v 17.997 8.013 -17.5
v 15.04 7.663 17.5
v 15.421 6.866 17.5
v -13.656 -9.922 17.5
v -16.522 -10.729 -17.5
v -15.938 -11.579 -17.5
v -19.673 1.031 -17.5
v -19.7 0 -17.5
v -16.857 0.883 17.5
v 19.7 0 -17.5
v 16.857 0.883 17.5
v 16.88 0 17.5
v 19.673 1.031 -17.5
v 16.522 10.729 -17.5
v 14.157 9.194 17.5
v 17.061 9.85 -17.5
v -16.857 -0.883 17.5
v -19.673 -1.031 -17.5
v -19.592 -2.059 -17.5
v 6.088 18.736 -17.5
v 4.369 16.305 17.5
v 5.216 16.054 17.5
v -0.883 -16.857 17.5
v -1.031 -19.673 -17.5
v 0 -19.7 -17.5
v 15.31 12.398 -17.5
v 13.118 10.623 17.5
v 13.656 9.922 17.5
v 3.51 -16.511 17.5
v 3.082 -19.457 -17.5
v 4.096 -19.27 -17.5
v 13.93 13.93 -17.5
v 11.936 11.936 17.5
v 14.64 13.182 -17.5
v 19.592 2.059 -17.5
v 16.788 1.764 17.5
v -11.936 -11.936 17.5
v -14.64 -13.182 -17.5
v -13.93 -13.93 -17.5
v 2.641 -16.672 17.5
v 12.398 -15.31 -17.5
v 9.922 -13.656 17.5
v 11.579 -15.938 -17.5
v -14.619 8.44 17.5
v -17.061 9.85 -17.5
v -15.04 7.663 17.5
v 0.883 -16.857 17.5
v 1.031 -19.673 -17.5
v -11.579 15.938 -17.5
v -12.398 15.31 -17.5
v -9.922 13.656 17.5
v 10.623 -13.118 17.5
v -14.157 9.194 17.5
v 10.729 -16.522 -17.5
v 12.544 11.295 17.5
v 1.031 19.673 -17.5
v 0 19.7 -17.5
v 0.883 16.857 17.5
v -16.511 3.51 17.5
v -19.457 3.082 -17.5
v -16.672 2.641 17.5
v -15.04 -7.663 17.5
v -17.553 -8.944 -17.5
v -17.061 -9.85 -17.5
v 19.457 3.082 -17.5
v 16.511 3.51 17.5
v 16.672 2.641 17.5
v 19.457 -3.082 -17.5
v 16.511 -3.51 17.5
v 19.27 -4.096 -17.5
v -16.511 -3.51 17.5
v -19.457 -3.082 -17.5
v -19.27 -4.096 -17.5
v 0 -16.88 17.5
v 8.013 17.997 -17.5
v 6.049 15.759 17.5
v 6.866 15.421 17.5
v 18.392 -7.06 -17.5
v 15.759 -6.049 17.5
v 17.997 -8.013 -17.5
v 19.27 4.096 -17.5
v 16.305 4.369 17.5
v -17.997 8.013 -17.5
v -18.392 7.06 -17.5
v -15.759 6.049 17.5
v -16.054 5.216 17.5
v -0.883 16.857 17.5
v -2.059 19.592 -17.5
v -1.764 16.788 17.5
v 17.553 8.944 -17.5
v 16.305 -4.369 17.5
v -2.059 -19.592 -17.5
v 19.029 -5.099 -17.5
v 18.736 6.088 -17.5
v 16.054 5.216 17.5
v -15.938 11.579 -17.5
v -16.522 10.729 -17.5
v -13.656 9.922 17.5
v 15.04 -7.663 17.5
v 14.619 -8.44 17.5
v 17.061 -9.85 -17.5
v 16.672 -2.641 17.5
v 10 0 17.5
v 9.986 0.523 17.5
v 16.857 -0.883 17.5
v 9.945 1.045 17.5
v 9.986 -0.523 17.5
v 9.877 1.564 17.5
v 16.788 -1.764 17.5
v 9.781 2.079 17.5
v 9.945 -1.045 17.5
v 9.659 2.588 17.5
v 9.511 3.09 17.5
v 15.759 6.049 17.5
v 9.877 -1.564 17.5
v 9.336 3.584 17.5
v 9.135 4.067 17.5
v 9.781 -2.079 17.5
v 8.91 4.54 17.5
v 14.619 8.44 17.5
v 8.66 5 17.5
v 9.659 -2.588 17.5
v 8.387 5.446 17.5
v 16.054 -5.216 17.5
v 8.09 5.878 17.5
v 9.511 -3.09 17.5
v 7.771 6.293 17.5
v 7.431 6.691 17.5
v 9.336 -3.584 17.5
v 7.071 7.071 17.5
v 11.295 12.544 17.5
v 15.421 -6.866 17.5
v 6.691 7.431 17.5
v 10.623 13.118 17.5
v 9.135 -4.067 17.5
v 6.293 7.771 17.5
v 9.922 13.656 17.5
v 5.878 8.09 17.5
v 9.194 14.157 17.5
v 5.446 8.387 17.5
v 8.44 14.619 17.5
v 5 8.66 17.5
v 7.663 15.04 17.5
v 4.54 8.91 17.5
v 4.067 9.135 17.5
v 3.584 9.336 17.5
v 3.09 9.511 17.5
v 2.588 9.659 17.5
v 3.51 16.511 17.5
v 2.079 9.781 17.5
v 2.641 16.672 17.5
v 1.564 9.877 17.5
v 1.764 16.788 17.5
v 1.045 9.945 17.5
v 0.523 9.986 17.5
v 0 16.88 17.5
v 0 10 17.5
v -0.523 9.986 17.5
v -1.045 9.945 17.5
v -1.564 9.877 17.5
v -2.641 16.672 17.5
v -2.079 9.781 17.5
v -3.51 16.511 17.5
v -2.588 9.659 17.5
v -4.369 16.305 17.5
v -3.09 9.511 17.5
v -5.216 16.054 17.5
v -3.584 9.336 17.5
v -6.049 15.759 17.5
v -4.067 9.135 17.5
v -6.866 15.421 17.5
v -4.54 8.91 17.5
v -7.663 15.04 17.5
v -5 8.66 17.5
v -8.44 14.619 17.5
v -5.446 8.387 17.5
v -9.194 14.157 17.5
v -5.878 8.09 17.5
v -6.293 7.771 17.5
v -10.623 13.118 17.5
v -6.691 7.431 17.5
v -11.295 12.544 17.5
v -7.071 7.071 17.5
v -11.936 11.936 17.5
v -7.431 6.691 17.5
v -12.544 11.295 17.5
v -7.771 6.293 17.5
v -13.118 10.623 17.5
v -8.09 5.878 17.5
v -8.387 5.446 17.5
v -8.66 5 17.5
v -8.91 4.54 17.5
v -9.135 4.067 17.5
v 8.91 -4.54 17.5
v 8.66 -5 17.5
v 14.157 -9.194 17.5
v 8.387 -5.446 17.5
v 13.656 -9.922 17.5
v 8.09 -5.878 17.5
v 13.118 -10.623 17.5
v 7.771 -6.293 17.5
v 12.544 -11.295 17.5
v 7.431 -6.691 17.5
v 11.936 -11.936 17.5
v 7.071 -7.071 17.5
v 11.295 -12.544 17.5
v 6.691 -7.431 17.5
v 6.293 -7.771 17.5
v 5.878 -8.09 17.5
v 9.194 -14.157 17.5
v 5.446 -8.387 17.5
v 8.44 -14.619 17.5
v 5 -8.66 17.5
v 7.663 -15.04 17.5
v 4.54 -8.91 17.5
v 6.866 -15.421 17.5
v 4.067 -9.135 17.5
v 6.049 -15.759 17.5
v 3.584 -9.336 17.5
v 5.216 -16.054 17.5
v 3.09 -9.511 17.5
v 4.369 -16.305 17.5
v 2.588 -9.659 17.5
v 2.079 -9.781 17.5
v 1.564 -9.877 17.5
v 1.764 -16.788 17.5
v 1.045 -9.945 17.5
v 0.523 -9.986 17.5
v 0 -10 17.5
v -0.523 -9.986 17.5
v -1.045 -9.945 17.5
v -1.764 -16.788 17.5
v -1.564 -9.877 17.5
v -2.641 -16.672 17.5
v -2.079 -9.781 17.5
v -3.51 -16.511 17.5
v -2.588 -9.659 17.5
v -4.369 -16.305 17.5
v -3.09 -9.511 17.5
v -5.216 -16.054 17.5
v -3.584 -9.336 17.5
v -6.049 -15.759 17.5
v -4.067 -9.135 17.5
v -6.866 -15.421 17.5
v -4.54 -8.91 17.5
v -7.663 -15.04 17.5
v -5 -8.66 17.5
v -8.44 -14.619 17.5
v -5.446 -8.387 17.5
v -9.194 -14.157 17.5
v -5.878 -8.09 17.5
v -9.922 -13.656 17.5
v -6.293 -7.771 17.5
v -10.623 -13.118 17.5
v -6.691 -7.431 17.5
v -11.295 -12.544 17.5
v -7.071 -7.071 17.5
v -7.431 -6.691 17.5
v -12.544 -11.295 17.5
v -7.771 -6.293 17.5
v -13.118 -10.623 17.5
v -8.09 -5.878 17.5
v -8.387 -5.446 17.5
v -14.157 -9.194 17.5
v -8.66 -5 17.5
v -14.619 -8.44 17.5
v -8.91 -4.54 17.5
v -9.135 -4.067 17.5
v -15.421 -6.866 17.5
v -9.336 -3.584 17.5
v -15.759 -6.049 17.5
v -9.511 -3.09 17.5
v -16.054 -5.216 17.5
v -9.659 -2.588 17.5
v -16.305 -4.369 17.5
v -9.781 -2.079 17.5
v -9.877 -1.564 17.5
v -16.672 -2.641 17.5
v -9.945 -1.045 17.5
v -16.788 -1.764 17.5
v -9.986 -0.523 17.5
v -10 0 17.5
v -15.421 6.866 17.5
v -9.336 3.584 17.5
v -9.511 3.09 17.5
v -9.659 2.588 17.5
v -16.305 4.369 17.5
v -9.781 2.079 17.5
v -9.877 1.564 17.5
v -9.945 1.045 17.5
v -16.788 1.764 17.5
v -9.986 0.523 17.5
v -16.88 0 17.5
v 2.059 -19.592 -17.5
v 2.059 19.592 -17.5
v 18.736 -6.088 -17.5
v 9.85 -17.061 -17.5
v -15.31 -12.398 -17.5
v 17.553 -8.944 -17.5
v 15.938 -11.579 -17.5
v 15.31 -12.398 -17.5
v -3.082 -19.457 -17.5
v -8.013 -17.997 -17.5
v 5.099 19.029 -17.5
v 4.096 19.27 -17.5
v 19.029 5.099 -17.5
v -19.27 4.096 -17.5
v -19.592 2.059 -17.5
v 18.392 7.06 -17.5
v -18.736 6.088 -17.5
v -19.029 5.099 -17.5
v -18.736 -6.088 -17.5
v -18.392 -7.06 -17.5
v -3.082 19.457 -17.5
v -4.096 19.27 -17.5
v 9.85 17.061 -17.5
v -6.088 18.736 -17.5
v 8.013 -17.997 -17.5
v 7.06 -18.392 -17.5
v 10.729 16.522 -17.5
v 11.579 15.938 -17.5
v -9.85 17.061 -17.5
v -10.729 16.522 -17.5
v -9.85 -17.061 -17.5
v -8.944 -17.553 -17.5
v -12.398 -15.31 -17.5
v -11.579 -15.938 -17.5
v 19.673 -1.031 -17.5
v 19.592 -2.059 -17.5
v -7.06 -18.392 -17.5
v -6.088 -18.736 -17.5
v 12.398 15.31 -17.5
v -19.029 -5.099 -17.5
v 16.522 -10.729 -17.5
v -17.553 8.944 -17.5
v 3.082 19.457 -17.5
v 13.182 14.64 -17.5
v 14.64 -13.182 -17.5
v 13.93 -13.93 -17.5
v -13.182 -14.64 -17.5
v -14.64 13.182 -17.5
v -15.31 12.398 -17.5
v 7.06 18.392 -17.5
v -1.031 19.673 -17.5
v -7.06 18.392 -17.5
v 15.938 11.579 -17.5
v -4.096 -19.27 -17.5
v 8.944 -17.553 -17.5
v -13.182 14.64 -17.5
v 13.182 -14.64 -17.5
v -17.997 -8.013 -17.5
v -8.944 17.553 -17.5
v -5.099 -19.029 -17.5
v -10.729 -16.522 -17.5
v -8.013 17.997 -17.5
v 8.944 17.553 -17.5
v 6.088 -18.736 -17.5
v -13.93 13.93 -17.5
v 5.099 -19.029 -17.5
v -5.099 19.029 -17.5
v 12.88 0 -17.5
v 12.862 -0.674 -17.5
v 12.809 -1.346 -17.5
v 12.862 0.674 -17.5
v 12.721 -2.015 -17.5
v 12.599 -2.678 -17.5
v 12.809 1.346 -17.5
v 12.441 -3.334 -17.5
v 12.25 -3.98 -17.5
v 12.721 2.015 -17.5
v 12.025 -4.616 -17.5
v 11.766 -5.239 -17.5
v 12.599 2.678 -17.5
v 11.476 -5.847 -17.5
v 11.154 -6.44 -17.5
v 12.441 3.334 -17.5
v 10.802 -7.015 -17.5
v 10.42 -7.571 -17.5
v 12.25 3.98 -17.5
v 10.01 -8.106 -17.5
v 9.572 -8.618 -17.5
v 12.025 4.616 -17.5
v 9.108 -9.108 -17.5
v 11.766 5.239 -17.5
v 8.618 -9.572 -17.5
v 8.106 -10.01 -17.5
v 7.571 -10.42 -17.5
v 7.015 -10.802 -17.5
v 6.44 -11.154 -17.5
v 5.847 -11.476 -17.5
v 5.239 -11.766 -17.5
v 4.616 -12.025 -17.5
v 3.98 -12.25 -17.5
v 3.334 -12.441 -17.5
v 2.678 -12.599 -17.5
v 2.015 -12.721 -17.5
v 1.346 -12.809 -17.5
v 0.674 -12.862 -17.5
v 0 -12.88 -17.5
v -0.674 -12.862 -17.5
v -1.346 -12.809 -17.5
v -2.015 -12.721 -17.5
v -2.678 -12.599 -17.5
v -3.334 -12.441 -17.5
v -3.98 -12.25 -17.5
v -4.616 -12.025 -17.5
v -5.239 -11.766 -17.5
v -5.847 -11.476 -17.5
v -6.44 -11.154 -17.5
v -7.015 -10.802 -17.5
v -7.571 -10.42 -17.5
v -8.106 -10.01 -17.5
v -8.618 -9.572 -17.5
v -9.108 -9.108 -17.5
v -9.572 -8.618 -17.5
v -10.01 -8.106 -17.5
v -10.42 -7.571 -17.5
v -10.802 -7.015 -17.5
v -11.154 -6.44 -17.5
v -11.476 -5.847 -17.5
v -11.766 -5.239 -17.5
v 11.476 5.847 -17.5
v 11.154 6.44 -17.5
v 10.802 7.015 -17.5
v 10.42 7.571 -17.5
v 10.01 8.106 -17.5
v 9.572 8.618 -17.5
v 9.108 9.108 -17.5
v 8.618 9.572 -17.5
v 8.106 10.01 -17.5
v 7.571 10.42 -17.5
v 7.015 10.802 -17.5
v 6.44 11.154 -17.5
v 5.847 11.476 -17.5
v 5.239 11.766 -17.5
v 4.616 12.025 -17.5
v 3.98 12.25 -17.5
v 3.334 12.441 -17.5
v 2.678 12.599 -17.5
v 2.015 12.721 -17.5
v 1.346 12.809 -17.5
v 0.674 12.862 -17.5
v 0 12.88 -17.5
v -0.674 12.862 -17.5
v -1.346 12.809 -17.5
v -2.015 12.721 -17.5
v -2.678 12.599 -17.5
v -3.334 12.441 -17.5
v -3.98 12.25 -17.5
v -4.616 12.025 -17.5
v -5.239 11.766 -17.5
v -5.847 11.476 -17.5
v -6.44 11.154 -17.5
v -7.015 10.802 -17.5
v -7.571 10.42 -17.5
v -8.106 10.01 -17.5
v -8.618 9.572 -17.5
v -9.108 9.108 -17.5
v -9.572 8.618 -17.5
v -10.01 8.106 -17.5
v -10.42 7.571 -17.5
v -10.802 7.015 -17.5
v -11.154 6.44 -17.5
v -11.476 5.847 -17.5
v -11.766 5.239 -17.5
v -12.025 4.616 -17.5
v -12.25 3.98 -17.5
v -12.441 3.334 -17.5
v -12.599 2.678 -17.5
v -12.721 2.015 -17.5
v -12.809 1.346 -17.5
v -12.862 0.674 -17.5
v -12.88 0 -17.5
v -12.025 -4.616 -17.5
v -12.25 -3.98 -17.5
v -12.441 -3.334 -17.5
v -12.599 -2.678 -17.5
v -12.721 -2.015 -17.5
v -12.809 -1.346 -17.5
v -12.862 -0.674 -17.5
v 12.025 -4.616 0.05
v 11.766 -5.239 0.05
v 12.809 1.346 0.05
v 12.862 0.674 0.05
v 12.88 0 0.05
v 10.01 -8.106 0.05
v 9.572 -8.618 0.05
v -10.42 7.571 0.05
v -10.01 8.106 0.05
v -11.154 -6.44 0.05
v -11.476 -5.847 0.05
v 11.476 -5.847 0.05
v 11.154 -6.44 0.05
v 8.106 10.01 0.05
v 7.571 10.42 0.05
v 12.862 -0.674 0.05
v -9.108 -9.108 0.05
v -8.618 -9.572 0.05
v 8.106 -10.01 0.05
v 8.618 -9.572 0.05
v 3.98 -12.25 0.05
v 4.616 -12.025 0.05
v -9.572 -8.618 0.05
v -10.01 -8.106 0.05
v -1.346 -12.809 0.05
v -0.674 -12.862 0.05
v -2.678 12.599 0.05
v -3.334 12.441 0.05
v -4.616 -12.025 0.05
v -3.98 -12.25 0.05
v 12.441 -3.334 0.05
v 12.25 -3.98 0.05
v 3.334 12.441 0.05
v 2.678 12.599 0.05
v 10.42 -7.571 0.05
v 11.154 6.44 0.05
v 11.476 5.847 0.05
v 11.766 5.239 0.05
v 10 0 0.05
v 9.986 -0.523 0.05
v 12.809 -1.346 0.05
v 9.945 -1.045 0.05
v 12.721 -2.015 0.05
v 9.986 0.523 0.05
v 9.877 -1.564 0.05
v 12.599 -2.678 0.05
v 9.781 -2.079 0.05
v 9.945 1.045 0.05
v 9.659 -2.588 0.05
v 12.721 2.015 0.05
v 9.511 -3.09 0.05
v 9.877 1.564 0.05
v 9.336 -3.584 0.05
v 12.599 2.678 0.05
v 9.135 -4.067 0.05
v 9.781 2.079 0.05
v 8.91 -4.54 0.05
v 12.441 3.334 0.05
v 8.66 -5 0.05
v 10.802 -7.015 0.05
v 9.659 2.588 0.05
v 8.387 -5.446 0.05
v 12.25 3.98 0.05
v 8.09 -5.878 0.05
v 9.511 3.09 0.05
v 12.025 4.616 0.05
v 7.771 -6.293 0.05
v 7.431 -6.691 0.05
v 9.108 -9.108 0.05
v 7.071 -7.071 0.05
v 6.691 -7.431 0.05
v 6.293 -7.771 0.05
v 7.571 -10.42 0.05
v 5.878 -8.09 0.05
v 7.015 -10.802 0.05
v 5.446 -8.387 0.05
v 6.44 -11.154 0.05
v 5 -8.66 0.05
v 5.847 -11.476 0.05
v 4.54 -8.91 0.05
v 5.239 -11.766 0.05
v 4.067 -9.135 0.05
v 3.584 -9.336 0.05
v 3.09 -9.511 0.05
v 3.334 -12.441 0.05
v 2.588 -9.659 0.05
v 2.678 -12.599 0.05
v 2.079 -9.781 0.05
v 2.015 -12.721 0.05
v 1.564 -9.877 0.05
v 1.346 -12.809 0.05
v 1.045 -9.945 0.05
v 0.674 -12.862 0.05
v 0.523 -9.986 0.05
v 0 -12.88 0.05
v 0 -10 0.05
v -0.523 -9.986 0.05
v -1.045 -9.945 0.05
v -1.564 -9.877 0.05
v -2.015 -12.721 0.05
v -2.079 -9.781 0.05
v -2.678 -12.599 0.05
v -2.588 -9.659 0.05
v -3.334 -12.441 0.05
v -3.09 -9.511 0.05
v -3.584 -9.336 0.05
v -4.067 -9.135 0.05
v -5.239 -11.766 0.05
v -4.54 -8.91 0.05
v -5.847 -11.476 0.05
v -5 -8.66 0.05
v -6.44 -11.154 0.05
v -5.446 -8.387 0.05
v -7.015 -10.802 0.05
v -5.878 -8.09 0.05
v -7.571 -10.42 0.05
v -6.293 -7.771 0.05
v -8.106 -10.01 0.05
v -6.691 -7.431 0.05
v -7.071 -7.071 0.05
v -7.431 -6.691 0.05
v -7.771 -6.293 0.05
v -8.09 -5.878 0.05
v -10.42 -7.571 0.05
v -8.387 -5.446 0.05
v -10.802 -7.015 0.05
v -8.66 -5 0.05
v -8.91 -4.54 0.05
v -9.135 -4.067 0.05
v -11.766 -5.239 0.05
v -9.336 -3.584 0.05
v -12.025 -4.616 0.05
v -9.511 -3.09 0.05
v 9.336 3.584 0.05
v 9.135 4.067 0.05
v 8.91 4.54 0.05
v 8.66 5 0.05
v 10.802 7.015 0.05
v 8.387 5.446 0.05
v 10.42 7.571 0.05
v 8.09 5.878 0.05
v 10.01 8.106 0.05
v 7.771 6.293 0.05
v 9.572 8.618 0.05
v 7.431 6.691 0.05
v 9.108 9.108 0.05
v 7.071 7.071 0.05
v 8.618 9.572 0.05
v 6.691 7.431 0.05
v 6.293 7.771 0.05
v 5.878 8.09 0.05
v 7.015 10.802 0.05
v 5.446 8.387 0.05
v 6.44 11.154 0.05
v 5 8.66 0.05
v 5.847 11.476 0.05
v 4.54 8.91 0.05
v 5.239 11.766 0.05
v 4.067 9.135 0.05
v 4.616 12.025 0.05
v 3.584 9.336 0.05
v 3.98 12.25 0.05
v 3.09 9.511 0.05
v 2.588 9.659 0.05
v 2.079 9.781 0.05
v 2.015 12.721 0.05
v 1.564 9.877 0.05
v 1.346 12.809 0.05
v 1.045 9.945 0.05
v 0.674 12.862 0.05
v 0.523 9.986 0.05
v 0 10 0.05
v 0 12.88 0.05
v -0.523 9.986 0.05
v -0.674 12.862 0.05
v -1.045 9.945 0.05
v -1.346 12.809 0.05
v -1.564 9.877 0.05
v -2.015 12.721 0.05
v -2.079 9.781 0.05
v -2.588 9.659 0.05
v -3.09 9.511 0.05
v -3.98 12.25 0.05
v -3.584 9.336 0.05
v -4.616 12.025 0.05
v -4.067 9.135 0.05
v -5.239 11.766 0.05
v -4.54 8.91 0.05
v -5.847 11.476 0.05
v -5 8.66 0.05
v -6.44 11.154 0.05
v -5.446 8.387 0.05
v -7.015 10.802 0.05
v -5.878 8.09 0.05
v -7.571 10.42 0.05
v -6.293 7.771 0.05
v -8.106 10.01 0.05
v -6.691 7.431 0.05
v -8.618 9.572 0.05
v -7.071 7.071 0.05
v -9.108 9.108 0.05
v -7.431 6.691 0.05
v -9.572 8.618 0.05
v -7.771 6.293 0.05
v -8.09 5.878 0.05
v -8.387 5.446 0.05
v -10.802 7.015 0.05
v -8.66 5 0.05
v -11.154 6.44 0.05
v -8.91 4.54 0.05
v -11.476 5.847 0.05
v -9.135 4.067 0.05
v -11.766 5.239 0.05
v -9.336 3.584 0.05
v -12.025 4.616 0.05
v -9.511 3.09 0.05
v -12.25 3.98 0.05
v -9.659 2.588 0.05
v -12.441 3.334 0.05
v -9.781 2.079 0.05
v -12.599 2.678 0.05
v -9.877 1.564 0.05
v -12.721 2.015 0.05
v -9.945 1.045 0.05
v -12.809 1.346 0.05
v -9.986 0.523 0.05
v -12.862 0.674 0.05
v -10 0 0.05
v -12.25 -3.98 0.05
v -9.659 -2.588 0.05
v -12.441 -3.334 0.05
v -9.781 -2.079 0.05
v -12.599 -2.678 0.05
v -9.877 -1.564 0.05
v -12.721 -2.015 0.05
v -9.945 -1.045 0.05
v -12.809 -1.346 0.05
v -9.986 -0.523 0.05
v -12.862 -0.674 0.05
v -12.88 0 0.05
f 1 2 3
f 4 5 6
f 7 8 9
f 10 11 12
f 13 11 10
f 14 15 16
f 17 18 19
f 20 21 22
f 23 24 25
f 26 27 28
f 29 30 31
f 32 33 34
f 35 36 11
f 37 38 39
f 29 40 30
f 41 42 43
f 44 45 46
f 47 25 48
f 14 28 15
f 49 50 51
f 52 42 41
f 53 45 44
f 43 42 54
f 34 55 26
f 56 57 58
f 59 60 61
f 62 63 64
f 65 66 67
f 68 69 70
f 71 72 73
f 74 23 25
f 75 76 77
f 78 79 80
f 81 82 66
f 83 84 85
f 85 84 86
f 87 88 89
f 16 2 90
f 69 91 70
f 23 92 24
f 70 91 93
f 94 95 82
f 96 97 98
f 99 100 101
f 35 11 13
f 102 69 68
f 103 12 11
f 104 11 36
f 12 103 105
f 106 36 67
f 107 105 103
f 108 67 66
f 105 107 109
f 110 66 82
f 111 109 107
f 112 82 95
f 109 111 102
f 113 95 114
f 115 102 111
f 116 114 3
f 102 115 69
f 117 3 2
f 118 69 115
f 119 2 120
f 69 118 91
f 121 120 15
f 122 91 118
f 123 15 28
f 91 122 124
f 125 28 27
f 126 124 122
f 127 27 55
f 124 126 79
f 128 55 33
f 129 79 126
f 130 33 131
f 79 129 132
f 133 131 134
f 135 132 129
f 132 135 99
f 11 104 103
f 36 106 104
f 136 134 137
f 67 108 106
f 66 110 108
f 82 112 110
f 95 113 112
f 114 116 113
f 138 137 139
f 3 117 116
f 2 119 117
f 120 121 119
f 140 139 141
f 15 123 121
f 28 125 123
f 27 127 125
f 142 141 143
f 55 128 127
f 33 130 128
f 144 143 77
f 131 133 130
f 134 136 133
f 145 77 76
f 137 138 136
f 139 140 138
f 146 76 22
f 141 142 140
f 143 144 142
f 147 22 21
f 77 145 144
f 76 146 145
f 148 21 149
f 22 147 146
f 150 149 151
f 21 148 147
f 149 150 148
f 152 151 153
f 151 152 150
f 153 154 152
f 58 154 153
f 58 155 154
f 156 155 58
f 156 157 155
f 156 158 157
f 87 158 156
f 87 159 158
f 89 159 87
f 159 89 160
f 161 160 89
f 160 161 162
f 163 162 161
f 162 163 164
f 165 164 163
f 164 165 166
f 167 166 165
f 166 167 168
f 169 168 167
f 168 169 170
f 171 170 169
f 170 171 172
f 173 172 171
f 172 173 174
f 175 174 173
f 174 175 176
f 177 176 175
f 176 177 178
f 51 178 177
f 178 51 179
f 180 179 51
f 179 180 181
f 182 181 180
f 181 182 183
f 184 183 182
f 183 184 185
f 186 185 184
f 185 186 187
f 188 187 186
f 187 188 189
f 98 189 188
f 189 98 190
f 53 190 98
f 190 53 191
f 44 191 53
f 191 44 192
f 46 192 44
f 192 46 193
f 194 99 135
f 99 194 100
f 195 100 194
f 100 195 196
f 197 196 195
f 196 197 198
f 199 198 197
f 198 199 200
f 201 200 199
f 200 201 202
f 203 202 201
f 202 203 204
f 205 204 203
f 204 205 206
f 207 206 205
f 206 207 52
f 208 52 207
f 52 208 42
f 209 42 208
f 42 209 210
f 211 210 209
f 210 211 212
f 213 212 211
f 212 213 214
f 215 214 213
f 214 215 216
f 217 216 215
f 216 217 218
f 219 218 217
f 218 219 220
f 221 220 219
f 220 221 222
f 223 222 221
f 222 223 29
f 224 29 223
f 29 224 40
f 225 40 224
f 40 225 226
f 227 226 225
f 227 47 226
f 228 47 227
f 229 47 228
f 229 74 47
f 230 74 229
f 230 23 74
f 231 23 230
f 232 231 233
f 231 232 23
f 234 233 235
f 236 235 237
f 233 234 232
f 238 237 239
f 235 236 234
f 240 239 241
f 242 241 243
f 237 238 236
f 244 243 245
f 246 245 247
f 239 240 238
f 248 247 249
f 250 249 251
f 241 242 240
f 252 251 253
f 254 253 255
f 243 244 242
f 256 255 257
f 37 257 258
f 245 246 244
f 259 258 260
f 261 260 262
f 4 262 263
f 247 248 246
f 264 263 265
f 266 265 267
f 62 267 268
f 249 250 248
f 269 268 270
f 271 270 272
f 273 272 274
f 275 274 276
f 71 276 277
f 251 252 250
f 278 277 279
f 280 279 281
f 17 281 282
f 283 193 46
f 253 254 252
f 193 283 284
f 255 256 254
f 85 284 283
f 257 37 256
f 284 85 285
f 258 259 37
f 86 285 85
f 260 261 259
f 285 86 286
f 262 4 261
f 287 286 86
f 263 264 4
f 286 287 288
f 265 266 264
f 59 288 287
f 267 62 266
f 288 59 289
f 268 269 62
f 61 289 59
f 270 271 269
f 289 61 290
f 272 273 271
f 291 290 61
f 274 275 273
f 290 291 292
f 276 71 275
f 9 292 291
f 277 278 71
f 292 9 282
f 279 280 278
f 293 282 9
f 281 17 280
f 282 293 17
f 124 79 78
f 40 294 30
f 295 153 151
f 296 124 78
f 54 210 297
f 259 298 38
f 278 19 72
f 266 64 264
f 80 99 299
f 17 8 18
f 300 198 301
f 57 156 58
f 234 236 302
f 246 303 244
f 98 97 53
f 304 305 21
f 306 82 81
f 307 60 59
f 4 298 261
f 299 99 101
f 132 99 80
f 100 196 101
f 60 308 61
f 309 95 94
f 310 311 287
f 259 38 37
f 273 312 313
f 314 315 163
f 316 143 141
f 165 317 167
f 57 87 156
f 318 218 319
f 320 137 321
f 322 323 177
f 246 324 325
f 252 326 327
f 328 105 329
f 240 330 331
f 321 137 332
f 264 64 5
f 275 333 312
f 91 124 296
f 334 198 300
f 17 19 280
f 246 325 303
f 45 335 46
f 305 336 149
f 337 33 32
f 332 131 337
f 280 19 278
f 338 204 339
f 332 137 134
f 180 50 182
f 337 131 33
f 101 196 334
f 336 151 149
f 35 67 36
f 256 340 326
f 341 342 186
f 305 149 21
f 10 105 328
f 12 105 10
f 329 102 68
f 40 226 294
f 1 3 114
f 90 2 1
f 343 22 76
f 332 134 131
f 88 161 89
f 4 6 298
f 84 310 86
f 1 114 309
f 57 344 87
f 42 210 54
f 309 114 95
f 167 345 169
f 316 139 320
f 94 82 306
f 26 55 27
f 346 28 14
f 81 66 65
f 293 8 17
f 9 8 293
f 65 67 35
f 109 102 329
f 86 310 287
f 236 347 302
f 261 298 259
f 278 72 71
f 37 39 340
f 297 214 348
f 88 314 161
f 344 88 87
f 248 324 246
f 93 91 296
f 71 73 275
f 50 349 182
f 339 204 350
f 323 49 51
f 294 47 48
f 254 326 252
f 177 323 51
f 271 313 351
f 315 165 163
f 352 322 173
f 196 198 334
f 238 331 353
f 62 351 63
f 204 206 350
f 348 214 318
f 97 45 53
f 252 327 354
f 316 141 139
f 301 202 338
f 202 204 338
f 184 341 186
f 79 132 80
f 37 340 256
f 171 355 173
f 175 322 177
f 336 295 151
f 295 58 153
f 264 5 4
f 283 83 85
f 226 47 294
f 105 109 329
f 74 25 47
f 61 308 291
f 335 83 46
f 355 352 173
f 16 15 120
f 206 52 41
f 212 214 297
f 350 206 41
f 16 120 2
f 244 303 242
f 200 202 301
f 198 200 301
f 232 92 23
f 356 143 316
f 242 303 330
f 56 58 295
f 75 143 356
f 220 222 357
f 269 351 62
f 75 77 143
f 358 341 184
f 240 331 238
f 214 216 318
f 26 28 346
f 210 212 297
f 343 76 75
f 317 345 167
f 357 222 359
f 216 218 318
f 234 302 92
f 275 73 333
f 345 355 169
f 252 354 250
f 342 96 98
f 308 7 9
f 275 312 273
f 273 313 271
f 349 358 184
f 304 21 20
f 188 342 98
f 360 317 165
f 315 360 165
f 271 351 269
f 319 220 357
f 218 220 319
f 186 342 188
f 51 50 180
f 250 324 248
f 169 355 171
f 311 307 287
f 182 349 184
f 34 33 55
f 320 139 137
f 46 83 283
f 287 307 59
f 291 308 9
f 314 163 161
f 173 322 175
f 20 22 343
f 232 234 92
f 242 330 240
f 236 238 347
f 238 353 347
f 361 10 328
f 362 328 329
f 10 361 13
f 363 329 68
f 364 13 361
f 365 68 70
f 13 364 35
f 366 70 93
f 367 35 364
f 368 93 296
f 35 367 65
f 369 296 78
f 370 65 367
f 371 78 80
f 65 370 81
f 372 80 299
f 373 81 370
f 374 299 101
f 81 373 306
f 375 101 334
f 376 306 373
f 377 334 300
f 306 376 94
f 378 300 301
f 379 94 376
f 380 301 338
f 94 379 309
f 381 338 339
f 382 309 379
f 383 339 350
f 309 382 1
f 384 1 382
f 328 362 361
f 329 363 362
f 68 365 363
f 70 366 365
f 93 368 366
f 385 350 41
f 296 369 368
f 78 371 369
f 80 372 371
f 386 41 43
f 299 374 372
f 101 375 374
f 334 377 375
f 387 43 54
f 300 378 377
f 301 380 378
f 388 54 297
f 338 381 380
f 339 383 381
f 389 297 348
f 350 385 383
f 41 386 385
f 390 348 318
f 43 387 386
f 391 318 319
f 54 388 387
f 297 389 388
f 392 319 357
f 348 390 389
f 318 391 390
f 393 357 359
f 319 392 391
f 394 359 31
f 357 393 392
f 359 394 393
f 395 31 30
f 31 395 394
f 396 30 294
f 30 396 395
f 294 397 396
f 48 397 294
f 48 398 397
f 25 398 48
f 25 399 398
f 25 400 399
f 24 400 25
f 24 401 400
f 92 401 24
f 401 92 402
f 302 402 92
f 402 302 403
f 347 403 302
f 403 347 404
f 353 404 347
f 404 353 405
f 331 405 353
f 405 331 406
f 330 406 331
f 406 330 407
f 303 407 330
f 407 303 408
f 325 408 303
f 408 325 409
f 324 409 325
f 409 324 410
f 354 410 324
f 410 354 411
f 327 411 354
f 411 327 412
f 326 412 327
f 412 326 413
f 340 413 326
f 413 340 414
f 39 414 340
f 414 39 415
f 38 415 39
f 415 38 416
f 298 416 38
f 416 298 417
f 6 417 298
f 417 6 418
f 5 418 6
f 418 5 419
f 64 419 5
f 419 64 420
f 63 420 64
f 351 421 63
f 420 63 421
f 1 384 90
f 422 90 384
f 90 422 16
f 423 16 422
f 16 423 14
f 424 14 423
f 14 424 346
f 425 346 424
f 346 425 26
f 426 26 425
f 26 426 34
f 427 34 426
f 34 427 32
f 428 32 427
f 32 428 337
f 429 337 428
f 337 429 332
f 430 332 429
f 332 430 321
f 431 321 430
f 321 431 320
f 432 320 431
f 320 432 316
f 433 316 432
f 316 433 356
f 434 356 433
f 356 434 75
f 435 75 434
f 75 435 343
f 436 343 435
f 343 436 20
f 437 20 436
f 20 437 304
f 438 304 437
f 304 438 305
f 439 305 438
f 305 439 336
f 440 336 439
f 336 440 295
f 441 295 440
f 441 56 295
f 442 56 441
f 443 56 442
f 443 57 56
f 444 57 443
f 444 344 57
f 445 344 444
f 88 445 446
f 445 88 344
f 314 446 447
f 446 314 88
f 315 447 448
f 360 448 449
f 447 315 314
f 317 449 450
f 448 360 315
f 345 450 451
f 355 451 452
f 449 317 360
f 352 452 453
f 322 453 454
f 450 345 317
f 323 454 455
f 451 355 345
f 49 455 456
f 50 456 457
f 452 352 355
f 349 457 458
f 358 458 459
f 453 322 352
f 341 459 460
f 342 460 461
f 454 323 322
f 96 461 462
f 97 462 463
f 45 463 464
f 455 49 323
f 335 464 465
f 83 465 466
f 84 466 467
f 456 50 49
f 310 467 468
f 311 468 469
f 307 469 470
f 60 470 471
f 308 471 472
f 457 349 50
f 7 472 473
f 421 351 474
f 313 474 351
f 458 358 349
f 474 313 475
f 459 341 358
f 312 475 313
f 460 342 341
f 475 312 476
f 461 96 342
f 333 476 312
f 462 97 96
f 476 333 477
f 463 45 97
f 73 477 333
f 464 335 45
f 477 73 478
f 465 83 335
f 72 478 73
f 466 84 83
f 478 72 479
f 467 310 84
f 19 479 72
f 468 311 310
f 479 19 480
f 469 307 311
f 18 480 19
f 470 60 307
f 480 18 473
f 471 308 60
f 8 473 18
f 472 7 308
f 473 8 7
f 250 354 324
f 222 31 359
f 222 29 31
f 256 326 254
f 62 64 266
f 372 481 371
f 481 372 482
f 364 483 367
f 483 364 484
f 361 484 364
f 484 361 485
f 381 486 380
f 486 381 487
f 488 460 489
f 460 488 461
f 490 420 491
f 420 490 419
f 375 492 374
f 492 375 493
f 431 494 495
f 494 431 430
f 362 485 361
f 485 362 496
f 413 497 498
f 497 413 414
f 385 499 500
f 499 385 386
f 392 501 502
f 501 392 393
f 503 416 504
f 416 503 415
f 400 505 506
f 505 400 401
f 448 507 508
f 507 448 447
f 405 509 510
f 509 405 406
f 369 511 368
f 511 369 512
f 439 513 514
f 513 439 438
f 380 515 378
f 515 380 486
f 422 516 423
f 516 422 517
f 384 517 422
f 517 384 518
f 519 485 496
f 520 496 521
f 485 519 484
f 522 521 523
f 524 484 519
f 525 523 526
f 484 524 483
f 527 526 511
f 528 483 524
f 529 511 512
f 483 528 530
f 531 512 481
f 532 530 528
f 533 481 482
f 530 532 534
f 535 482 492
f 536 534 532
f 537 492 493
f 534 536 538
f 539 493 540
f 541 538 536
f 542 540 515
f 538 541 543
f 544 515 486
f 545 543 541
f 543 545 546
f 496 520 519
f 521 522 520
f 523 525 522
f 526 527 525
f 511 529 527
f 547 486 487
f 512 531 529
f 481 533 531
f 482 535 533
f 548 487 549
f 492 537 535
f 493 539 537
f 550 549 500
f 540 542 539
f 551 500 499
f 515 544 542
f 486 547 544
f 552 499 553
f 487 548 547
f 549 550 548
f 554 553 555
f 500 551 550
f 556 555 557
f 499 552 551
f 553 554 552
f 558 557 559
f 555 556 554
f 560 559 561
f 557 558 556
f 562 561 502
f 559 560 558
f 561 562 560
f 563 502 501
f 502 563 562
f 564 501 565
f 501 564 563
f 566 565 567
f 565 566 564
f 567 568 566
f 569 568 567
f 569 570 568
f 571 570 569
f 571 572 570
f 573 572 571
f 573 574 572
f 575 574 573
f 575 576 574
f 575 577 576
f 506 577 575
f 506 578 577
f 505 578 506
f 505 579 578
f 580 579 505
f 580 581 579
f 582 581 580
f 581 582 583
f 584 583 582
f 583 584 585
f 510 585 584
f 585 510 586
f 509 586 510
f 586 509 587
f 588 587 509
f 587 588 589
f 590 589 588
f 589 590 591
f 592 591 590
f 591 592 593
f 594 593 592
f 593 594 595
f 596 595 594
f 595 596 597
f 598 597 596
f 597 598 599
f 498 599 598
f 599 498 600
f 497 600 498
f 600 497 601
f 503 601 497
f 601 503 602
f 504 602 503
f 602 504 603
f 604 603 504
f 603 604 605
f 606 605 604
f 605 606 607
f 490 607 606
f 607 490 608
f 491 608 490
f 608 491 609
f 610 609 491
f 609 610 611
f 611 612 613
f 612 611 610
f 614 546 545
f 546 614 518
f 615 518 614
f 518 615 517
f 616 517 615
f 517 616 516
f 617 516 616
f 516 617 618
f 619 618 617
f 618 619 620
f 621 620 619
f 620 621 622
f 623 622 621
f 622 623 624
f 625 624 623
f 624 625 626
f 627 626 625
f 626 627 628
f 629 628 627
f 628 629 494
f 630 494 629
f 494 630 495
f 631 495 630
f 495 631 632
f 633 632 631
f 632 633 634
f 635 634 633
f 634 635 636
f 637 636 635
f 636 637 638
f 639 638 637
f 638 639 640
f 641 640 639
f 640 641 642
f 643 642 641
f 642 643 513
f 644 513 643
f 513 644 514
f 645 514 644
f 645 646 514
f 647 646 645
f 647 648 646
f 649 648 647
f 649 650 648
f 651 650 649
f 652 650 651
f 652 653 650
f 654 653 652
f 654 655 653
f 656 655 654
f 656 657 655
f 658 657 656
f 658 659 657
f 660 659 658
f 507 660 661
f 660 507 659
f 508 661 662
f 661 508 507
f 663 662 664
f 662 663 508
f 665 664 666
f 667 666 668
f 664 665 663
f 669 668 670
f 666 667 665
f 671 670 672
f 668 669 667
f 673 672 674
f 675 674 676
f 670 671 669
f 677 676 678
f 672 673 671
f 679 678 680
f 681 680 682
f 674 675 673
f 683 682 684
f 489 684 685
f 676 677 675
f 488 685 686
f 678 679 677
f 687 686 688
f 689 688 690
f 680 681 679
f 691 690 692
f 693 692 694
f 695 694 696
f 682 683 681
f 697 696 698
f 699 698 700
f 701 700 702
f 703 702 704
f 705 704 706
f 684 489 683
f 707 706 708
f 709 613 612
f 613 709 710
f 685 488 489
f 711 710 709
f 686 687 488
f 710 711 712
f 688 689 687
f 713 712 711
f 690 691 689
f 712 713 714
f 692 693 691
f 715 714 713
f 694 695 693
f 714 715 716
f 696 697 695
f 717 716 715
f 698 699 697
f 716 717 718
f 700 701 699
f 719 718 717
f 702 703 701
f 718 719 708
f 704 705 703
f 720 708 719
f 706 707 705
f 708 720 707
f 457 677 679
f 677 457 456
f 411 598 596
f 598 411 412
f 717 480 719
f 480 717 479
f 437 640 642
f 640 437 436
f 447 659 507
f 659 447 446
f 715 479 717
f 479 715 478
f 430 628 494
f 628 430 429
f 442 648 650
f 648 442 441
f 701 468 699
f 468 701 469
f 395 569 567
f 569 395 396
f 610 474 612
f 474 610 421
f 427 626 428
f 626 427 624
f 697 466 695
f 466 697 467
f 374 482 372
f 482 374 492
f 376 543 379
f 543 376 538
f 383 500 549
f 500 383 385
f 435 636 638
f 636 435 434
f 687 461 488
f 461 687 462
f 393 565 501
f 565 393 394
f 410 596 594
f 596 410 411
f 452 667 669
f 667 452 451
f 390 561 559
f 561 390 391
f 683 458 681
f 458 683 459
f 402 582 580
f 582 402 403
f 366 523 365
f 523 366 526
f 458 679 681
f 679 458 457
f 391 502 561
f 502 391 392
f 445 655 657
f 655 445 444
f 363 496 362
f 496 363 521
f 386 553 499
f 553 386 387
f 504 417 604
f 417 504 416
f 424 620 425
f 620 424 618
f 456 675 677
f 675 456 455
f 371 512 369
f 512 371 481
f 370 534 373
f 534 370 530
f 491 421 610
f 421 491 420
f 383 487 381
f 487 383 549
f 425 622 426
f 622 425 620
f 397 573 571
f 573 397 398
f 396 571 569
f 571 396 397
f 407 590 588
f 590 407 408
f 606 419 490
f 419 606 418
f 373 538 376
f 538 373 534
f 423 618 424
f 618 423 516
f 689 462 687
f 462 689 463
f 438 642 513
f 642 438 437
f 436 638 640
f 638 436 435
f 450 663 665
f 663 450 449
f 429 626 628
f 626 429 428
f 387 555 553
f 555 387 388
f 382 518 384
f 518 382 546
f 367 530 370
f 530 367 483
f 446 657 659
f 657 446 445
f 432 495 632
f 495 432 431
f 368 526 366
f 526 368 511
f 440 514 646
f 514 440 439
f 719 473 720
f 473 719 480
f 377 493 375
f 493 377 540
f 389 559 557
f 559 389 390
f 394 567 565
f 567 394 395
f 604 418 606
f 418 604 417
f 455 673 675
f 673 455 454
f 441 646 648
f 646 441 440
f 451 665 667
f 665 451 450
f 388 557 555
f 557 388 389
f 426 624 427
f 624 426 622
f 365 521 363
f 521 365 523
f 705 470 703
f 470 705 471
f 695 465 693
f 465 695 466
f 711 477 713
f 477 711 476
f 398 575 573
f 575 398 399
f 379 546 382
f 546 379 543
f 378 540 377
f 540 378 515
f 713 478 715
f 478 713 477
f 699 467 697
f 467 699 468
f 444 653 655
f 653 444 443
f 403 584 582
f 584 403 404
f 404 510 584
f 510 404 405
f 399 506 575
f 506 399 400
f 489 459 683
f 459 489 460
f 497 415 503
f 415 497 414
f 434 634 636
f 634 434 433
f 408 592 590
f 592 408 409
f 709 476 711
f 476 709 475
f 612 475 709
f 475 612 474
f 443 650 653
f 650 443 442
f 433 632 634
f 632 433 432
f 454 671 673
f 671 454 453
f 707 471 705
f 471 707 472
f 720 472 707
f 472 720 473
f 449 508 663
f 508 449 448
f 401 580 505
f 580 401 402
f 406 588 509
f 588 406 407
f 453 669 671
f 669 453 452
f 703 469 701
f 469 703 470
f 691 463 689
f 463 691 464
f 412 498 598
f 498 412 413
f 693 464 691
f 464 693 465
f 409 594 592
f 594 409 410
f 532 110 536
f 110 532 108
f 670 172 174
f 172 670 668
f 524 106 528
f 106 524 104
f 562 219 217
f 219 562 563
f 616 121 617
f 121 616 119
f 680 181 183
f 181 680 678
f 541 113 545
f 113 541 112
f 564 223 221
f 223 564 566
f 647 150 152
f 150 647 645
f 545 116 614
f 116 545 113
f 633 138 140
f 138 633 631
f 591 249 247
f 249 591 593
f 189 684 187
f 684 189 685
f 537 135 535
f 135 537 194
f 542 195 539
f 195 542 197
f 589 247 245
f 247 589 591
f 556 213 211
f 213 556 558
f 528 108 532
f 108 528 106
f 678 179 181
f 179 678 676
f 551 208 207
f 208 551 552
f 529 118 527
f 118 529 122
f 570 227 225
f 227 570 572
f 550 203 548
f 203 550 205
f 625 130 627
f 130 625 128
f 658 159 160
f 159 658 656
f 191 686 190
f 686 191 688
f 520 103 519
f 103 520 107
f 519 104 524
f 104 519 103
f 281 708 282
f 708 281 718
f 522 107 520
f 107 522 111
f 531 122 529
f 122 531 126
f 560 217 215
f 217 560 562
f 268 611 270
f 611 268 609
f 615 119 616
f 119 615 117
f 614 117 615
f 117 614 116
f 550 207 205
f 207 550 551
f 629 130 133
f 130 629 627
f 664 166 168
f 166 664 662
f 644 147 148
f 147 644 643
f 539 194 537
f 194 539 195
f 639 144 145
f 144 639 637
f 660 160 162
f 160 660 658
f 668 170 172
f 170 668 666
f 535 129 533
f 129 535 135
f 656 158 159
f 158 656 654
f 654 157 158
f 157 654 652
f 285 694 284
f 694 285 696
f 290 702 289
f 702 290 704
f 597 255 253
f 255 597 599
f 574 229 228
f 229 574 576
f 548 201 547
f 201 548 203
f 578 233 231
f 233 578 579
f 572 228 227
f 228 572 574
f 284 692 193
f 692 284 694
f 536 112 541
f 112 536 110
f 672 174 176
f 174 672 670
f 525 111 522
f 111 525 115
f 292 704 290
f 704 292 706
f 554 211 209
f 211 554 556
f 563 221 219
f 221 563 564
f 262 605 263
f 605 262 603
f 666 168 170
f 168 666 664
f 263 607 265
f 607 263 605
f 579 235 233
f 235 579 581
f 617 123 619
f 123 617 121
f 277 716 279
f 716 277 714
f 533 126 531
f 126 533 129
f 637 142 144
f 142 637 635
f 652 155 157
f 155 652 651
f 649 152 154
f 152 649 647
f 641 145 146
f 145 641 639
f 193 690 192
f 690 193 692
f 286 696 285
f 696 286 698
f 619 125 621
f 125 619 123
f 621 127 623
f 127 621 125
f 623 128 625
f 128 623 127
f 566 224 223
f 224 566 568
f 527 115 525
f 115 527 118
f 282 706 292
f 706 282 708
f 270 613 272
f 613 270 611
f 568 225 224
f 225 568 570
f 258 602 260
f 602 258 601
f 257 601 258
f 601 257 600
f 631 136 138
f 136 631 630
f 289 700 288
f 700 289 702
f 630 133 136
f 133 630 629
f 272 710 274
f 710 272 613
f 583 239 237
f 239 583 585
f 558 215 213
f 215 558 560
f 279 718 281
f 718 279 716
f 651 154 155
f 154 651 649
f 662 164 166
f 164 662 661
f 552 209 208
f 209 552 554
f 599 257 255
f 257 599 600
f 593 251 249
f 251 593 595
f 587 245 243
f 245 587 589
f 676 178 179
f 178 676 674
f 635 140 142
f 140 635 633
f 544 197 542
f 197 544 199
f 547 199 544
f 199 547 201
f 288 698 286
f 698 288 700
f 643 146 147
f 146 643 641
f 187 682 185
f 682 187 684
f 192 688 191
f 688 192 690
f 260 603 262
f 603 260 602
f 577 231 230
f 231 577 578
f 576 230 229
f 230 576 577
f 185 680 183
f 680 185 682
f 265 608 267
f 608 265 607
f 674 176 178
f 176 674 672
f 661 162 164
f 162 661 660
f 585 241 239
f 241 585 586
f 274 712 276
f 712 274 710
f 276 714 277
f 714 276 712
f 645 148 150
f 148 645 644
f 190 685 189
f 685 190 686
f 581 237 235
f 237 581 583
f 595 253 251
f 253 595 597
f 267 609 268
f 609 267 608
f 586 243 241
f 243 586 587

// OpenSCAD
// =========================================================================
// PROJECT LCN-88: COMMERCIAL NPT PIPE INTERFACE ADAPTER
// Component Module: 25.4mm Slip to 1" NPT Thread Sleeve v1.0.0
// Licensed under CERN-OHL-S-2.0 (Strongly Reciprocal Open Hardware)
// =========================================================================

$fn = 120; // High-resolution layout factor for cleanroom workflows

sleeve_id = 25.76;         // Inside diameter to slip tightly over LCN-88 nozzles
adapter_length = 35.0;     // Mechanical engagement length
npt_outer_diameter = 33.4; // Approximated major diameter for 1" pipe fittings

difference() {
    // Outer tapered protective adapter casing
    cylinder(h=adapter_length, r1=npt_outer_diameter/2 + 3, r2=sleeve_id/2 + 4, center=true);
    
    // Smooth lower half receiver pocket for LCN-88 nozzle attachment
    translate([0, 0, -adapter_length/4])
        cylinder(h=adapter_length/2 + 0.1, r=sleeve_id/2, center=true);
        
    // Upper core fluid flow conduit passage
    cylinder(h=adapter_length + 2, r=20.0/2, center=true);
}
